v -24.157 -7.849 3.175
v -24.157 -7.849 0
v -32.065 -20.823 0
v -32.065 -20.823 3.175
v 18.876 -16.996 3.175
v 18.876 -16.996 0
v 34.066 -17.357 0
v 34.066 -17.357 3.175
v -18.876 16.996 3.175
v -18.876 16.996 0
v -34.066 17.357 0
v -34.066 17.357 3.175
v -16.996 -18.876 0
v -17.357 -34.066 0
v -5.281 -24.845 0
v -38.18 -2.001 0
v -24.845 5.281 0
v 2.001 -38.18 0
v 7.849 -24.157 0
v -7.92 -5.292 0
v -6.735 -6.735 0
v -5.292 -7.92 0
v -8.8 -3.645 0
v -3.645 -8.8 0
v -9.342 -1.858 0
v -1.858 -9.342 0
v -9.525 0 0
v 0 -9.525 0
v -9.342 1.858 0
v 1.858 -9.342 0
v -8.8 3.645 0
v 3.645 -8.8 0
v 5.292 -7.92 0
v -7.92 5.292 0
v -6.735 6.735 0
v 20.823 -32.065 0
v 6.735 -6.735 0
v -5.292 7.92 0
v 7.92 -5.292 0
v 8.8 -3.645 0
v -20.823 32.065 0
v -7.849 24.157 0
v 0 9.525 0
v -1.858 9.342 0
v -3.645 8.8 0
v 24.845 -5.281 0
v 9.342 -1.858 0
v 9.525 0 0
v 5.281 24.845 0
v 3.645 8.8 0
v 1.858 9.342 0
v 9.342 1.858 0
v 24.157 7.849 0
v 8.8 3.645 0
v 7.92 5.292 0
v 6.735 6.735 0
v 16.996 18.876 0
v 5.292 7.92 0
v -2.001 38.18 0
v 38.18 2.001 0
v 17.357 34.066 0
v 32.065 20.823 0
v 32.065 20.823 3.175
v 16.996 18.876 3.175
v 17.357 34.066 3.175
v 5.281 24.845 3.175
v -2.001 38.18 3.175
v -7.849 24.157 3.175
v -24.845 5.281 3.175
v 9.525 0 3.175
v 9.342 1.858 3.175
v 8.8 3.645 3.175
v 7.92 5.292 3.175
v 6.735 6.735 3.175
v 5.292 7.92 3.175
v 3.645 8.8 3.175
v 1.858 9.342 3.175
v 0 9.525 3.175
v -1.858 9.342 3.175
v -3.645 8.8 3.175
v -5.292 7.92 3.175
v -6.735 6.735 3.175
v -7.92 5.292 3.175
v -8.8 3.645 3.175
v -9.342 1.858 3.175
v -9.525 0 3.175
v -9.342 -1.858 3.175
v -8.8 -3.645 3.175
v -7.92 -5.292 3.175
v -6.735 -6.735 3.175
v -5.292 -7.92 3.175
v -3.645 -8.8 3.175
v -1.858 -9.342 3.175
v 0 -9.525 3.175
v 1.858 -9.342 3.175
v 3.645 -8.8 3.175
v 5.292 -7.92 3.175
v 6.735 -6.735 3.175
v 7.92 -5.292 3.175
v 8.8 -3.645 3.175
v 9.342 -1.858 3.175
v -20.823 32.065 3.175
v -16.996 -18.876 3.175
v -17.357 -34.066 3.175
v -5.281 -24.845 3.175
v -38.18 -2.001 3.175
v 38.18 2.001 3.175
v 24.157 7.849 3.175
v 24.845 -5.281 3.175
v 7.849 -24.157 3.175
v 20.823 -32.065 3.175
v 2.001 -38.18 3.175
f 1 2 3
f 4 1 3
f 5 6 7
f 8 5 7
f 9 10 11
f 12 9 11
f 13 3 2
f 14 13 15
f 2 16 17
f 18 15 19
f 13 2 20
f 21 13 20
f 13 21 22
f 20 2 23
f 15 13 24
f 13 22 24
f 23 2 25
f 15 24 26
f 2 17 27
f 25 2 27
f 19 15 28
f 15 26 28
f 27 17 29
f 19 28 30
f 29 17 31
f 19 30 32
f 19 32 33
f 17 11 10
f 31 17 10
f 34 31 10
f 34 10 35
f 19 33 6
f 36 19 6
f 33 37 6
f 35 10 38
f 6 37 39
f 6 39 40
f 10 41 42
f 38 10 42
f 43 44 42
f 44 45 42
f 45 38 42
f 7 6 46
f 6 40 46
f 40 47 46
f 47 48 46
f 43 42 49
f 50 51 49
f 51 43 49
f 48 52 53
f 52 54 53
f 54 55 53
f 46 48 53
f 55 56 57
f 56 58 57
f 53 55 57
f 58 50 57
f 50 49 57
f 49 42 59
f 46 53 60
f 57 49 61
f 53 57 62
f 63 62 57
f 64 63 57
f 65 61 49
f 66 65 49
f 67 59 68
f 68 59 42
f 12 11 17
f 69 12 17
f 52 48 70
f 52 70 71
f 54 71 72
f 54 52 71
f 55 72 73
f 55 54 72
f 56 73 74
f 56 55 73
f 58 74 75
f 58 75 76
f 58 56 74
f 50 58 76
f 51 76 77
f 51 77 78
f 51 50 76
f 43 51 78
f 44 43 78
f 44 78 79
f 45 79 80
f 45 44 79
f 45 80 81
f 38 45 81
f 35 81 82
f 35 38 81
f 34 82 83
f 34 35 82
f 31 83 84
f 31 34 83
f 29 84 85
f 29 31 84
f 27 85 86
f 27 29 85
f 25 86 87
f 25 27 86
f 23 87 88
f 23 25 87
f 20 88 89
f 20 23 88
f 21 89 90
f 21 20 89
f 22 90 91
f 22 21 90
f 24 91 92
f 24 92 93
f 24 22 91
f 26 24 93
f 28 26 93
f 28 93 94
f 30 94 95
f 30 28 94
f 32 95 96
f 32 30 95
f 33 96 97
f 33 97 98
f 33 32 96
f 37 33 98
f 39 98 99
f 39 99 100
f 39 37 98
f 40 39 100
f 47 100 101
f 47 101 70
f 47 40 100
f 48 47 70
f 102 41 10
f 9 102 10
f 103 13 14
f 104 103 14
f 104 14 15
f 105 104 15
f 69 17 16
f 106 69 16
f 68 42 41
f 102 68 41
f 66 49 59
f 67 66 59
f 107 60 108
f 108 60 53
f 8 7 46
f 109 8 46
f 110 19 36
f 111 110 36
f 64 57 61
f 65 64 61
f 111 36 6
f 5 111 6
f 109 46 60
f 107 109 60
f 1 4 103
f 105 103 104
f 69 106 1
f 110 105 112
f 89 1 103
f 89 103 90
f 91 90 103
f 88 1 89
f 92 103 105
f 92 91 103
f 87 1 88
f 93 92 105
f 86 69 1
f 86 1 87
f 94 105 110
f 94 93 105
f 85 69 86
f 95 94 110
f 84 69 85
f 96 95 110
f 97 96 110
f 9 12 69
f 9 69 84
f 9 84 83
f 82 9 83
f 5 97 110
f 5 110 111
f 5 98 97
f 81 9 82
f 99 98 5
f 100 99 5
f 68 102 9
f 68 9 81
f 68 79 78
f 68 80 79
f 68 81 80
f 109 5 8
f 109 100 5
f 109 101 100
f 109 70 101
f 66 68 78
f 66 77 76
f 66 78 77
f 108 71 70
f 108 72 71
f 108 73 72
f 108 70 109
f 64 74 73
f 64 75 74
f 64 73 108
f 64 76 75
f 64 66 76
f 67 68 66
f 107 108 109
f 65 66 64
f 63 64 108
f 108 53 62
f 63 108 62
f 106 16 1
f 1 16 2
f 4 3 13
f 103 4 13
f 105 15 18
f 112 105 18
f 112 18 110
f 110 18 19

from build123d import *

# Parameters (mm, degrees)
F0_R     = 9.525
F1_DEPTH = 3.175


with BuildPart() as f1:
    # F0 (on Top) → F1 (new body)
    with BuildSketch(Plane.XY):
        Polygon((-2.000947, 38.180346), (-7.849032, 24.156836), (-20.823044, 32.064676), (-18.875879, 16.995917), (-34.065623, 17.357302), (-24.844949, 5.280957), (-38.180346, -2.000947), (-24.156836, -7.849032), (-32.064676, -20.823044), (-16.995917, -18.875879), (-17.357302, -34.065623), (-5.280957, -24.844949), (2.000947, -38.180346), (7.849032, -24.156836), (20.823044, -32.064676), (18.875879, -16.995917), (34.065623, -17.357302), (24.844949, -5.280957), (38.180346, 2.000947), (24.156836, 7.849032), (32.064676, 20.823044), (16.995917, 18.875879), (17.357302, 34.065623), (5.280957, 24.844949), align=None)
        Circle(F0_R, mode=Mode.SUBTRACT)
    extrude(amount=F1_DEPTH)


solid = f1.part
